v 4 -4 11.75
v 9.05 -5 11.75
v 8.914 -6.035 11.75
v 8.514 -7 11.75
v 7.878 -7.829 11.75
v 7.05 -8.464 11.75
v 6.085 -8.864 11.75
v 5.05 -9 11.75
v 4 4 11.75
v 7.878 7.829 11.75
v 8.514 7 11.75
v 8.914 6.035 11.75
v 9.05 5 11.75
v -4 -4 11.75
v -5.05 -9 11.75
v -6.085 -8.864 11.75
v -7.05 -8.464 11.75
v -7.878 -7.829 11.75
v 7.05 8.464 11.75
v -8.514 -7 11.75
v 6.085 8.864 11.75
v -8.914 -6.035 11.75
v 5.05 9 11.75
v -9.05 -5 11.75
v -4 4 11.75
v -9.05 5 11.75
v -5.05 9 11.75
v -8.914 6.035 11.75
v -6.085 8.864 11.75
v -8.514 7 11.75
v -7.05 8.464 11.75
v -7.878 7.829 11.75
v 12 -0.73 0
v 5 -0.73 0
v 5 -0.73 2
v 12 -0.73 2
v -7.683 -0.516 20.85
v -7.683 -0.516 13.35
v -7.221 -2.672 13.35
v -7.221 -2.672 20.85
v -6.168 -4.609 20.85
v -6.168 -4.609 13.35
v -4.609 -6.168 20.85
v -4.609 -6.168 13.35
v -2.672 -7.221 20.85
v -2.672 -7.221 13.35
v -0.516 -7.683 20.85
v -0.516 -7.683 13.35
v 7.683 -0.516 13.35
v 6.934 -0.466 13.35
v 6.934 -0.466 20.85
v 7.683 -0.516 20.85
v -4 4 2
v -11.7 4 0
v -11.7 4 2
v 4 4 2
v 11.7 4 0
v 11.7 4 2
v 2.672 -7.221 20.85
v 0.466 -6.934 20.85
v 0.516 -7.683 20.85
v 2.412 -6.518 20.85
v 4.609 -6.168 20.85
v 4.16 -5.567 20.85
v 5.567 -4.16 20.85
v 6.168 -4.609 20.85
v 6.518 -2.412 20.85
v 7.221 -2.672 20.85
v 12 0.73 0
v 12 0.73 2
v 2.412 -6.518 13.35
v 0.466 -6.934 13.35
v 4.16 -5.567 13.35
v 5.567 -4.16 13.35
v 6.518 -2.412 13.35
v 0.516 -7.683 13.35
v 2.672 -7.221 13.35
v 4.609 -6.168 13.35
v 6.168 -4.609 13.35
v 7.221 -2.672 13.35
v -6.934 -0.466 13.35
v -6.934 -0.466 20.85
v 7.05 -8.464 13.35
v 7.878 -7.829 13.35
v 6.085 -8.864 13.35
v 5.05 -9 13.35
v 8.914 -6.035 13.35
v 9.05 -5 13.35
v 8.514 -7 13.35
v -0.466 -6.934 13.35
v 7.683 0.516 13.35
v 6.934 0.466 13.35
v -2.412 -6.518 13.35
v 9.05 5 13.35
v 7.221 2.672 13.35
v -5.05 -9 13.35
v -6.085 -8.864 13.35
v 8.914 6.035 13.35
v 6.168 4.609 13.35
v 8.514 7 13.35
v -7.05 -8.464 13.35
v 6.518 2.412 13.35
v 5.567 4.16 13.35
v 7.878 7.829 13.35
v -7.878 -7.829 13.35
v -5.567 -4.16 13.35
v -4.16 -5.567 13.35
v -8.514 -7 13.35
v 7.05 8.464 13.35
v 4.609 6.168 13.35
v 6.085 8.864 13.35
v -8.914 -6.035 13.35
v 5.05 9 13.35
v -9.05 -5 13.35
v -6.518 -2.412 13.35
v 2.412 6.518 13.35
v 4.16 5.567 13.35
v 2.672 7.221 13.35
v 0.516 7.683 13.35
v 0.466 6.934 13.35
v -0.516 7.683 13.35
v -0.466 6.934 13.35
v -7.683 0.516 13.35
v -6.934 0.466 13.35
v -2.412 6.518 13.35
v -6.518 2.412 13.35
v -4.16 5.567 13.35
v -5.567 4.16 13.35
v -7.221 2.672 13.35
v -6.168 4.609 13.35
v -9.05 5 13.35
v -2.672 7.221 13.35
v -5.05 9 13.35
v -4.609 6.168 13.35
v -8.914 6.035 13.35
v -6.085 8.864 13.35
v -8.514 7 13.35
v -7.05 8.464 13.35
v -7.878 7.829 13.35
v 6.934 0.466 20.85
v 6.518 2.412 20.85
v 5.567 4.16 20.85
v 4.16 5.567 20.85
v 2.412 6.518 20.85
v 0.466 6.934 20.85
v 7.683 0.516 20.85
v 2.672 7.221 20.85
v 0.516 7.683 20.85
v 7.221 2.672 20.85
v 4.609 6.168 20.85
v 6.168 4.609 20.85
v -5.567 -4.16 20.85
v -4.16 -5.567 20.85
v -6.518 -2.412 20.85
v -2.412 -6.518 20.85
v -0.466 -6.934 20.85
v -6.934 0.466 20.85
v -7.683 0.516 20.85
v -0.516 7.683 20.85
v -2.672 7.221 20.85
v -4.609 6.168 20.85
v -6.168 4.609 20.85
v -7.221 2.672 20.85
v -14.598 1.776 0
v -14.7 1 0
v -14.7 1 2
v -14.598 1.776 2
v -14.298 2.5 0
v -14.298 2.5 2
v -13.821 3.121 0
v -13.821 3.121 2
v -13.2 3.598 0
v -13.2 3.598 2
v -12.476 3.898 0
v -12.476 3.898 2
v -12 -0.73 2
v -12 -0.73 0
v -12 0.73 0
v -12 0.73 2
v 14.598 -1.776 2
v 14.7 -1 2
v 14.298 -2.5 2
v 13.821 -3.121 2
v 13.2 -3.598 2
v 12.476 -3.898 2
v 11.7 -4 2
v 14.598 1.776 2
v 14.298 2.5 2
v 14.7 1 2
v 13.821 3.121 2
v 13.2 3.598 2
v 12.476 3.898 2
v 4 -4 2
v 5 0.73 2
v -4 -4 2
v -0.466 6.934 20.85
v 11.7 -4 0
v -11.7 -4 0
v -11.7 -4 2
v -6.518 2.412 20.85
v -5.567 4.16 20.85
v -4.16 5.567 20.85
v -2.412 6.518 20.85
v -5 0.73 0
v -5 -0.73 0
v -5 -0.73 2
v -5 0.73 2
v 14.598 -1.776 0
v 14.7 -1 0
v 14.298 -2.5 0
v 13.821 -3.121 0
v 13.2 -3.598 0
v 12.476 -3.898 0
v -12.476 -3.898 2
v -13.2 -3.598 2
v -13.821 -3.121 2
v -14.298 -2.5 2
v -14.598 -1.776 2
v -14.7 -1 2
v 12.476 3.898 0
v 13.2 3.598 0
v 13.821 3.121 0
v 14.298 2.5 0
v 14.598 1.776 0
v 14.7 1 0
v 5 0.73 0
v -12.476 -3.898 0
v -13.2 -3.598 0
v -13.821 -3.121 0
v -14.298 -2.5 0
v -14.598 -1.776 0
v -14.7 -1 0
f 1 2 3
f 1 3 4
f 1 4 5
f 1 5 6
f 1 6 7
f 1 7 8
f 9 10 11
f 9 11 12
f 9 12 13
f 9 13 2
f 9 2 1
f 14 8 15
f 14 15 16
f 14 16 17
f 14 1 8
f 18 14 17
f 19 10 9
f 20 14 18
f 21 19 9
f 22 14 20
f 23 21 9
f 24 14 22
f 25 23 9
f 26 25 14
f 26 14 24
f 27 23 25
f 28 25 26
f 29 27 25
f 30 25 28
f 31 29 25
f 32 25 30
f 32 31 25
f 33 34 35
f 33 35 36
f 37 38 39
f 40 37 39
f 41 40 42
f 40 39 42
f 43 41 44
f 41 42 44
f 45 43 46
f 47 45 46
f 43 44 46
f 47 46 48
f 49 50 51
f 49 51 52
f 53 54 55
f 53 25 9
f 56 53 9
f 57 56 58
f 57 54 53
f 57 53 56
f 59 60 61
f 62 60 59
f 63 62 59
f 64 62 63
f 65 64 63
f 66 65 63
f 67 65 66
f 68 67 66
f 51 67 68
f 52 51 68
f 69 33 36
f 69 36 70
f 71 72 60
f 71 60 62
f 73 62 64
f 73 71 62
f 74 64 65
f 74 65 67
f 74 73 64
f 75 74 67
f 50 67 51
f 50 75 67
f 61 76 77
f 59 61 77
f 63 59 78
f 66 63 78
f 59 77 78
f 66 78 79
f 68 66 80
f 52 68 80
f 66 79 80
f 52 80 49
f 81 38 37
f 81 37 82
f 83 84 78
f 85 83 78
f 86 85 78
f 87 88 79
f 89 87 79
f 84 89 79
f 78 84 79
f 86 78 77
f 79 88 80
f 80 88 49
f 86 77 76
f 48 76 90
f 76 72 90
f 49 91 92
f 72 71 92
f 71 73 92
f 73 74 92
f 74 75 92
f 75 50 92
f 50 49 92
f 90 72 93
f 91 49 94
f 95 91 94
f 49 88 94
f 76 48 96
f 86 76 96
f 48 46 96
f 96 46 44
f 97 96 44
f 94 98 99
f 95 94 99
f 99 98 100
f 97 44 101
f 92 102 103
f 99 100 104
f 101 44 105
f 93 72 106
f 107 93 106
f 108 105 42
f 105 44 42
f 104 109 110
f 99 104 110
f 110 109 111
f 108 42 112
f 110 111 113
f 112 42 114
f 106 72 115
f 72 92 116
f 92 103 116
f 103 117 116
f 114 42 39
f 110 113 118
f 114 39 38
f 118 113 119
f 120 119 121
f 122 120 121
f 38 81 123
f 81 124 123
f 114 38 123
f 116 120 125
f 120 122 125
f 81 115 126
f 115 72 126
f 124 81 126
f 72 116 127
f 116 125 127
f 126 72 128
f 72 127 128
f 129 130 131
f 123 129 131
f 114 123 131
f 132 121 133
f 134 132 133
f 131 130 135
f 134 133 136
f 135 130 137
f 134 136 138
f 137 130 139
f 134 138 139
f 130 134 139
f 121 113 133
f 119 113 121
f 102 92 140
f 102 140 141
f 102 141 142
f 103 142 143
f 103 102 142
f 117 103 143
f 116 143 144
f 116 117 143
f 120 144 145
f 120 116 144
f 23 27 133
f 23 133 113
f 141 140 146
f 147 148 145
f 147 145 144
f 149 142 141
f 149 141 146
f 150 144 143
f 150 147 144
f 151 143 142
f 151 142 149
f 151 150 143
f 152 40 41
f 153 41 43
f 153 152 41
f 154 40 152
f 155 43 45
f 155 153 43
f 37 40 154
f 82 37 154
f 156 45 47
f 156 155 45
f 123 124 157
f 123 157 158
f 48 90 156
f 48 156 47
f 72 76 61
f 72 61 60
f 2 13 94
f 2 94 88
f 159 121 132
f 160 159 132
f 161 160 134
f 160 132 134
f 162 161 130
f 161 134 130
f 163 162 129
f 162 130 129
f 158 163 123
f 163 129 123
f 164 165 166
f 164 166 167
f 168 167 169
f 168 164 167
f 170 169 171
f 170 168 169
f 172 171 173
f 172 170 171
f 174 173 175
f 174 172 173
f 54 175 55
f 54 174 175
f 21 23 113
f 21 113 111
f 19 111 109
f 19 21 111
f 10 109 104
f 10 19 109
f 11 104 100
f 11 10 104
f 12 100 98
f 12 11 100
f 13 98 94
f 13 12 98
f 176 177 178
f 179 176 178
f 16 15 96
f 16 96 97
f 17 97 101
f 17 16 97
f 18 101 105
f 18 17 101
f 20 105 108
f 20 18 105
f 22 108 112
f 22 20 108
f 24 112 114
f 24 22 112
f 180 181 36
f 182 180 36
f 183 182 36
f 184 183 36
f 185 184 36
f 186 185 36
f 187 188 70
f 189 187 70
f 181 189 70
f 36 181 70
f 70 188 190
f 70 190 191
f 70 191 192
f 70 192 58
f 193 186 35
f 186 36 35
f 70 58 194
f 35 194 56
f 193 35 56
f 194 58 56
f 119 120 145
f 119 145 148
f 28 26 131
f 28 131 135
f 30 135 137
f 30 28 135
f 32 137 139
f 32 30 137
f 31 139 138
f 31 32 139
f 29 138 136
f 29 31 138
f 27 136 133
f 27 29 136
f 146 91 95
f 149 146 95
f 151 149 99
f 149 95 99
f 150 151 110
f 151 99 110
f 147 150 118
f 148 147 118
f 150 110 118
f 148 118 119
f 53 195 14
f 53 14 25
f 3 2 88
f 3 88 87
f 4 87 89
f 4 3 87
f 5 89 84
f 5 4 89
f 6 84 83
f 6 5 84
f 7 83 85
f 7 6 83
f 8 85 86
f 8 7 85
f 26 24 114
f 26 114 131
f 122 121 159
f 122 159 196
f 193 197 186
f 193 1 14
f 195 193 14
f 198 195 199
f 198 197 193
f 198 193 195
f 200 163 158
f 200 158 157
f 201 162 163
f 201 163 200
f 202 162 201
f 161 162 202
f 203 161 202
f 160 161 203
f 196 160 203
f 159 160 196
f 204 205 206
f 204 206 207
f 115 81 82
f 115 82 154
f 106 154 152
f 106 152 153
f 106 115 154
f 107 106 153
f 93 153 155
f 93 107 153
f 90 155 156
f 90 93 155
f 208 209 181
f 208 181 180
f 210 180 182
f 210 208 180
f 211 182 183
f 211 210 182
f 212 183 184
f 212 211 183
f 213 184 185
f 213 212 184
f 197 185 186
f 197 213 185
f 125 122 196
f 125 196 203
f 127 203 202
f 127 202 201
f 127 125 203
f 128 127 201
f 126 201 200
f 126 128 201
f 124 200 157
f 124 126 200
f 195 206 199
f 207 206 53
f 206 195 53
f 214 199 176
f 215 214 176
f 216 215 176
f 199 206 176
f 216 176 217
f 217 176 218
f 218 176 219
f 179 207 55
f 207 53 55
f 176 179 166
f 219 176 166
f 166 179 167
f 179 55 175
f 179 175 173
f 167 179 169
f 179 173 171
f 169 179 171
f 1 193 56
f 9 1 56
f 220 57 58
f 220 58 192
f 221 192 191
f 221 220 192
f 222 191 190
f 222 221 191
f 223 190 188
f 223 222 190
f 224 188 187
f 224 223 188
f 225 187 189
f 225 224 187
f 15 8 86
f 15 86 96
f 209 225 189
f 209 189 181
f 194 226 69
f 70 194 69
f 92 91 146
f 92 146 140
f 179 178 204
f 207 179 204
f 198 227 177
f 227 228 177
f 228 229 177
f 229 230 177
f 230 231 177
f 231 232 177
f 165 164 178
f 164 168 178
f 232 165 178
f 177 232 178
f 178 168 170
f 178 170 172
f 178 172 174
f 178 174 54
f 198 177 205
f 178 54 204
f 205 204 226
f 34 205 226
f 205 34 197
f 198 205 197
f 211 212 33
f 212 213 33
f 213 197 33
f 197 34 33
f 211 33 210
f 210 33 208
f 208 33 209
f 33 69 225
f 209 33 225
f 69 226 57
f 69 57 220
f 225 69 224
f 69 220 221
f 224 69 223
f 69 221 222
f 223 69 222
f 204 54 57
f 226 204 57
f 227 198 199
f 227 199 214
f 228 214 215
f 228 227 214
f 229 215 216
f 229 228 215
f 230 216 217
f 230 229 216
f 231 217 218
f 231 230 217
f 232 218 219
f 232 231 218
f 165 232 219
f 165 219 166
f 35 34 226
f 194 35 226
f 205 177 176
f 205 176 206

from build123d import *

# Parameters (mm, degrees)
SKETCH1_W           = 7
SKETCH1_H           = 1.46
BOSS_EXTRUDE1_DEPTH = 2
SKETCH2_W           = 8
SKETCH2_H           = 8
BOSS_EXTRUDE2_DEPTH = 11.74993
BOSS_EXTRUDE3_DEPTH = 1.6
SKETCH4_R           = 7.7
BOSS_EXTRUDE4_DEPTH = 7.5
SKETCH5_R           = 6.95
CUT_EXTRUDE1_DEPTH  = 7.5
CUT_EXTRUDE2_DEPTH  = 7.5
CIRPATTERN1_COUNT   = 4


with BuildPart() as part:
    # Sketch1 → Boss-Extrude1 (new body)
    with BuildSketch(Plane.XY):
        with BuildLine():
            Line((-11.7, 4), (11.7, 4))
            ThreePointArc((11.7, 4), (13.821320344, 3.121320344), (14.7, 1))
            Line((14.7, 1), (14.7, -1))
            ThreePointArc((14.7, -1), (13.821320344, -3.121320344), (11.7, -4))
            Line((11.7, -4), (-11.7, -4))
            ThreePointArc((-11.7, -4), (-13.821320344, -3.121320344), (-14.7, -1))
            Line((-14.7, -1), (-14.7, 1))
            ThreePointArc((-14.7, 1), (-13.821320344, 3.121320344), (-11.7, 4))
        make_face()
        with Locations((-8.5, 0)):
            Rectangle(SKETCH1_W, SKETCH1_H, mode=Mode.SUBTRACT)
        with Locations((8.5, 0)):
            Rectangle(SKETCH1_W, SKETCH1_H, mode=Mode.SUBTRACT)
    extrude(amount=BOSS_EXTRUDE1_DEPTH)

    # Sketch2 → Boss-Extrude2 (add)
    with BuildSketch(Plane.XY):
        Rectangle(SKETCH2_W, SKETCH2_H)
    extrude(amount=BOSS_EXTRUDE2_DEPTH)

    # Sketch3 → Boss-Extrude3 (add)
    with BuildSketch(Plane.XY.offset(11.74993)):
        with BuildLine():
            Line((-5.05, 9.000108401), (5.05, 9.000108401))
            ThreePointArc((5.05, 9.000108401), (7.878427125, 7.828535526), (9.05, 5.000108401))
            Line((9.05, 5.000108401), (9.05, -5.000108401))
            ThreePointArc((9.05, -5.000108401), (7.878427125, -7.828535526), (5.05, -9.000108401))
            Line((5.05, -9.000108401), (-5.05, -9.000108401))
            ThreePointArc((-5.05, -9.000108401), (-7.878427125, -7.828535526), (-9.05, -5.000108401))
            Line((-9.05, -5.000108401), (-9.05, 5.000108401))
            ThreePointArc((-9.05, 5.000108401), (-7.878427125, 7.828535526), (-5.05, 9.000108401))
        make_face()
    extrude(amount=BOSS_EXTRUDE3_DEPTH)

    # Sketch4 → Boss-Extrude4 (add)
    with BuildSketch(Plane.XY.offset(13.34993)):
        Circle(SKETCH4_R)
    extrude(amount=BOSS_EXTRUDE4_DEPTH)

    # Sketch5 → Cut-Extrude1 (cut)
    with BuildSketch(Plane.XY.offset(13.34993)):
        Circle(SKETCH5_R)
    extrude(amount=CUT_EXTRUDE1_DEPTH, mode=Mode.SUBTRACT)

    # Sketch11 → Cut-Extrude2 (cut)
    with BuildSketch(Plane.XY.offset(13.34993)):
        Polygon((0, 8.183776361), (-0.55, 8.183776361), (0, 0), (0.55, 8.183776361), align=None)
    cut_extrude2 = extrude(amount=CUT_EXTRUDE2_DEPTH, mode=Mode.SUBTRACT)

    # CirPattern1: Cut-Extrude2 ×4 about axis
    cirpattern1_axis = Axis((0, 0, 20.84993), (0, 0, -1))
    for i in range(1, CIRPATTERN1_COUNT):
        add(cut_extrude2.rotate(cirpattern1_axis, i * 360 / CIRPATTERN1_COUNT), mode=Mode.SUBTRACT)


solid = part.part
